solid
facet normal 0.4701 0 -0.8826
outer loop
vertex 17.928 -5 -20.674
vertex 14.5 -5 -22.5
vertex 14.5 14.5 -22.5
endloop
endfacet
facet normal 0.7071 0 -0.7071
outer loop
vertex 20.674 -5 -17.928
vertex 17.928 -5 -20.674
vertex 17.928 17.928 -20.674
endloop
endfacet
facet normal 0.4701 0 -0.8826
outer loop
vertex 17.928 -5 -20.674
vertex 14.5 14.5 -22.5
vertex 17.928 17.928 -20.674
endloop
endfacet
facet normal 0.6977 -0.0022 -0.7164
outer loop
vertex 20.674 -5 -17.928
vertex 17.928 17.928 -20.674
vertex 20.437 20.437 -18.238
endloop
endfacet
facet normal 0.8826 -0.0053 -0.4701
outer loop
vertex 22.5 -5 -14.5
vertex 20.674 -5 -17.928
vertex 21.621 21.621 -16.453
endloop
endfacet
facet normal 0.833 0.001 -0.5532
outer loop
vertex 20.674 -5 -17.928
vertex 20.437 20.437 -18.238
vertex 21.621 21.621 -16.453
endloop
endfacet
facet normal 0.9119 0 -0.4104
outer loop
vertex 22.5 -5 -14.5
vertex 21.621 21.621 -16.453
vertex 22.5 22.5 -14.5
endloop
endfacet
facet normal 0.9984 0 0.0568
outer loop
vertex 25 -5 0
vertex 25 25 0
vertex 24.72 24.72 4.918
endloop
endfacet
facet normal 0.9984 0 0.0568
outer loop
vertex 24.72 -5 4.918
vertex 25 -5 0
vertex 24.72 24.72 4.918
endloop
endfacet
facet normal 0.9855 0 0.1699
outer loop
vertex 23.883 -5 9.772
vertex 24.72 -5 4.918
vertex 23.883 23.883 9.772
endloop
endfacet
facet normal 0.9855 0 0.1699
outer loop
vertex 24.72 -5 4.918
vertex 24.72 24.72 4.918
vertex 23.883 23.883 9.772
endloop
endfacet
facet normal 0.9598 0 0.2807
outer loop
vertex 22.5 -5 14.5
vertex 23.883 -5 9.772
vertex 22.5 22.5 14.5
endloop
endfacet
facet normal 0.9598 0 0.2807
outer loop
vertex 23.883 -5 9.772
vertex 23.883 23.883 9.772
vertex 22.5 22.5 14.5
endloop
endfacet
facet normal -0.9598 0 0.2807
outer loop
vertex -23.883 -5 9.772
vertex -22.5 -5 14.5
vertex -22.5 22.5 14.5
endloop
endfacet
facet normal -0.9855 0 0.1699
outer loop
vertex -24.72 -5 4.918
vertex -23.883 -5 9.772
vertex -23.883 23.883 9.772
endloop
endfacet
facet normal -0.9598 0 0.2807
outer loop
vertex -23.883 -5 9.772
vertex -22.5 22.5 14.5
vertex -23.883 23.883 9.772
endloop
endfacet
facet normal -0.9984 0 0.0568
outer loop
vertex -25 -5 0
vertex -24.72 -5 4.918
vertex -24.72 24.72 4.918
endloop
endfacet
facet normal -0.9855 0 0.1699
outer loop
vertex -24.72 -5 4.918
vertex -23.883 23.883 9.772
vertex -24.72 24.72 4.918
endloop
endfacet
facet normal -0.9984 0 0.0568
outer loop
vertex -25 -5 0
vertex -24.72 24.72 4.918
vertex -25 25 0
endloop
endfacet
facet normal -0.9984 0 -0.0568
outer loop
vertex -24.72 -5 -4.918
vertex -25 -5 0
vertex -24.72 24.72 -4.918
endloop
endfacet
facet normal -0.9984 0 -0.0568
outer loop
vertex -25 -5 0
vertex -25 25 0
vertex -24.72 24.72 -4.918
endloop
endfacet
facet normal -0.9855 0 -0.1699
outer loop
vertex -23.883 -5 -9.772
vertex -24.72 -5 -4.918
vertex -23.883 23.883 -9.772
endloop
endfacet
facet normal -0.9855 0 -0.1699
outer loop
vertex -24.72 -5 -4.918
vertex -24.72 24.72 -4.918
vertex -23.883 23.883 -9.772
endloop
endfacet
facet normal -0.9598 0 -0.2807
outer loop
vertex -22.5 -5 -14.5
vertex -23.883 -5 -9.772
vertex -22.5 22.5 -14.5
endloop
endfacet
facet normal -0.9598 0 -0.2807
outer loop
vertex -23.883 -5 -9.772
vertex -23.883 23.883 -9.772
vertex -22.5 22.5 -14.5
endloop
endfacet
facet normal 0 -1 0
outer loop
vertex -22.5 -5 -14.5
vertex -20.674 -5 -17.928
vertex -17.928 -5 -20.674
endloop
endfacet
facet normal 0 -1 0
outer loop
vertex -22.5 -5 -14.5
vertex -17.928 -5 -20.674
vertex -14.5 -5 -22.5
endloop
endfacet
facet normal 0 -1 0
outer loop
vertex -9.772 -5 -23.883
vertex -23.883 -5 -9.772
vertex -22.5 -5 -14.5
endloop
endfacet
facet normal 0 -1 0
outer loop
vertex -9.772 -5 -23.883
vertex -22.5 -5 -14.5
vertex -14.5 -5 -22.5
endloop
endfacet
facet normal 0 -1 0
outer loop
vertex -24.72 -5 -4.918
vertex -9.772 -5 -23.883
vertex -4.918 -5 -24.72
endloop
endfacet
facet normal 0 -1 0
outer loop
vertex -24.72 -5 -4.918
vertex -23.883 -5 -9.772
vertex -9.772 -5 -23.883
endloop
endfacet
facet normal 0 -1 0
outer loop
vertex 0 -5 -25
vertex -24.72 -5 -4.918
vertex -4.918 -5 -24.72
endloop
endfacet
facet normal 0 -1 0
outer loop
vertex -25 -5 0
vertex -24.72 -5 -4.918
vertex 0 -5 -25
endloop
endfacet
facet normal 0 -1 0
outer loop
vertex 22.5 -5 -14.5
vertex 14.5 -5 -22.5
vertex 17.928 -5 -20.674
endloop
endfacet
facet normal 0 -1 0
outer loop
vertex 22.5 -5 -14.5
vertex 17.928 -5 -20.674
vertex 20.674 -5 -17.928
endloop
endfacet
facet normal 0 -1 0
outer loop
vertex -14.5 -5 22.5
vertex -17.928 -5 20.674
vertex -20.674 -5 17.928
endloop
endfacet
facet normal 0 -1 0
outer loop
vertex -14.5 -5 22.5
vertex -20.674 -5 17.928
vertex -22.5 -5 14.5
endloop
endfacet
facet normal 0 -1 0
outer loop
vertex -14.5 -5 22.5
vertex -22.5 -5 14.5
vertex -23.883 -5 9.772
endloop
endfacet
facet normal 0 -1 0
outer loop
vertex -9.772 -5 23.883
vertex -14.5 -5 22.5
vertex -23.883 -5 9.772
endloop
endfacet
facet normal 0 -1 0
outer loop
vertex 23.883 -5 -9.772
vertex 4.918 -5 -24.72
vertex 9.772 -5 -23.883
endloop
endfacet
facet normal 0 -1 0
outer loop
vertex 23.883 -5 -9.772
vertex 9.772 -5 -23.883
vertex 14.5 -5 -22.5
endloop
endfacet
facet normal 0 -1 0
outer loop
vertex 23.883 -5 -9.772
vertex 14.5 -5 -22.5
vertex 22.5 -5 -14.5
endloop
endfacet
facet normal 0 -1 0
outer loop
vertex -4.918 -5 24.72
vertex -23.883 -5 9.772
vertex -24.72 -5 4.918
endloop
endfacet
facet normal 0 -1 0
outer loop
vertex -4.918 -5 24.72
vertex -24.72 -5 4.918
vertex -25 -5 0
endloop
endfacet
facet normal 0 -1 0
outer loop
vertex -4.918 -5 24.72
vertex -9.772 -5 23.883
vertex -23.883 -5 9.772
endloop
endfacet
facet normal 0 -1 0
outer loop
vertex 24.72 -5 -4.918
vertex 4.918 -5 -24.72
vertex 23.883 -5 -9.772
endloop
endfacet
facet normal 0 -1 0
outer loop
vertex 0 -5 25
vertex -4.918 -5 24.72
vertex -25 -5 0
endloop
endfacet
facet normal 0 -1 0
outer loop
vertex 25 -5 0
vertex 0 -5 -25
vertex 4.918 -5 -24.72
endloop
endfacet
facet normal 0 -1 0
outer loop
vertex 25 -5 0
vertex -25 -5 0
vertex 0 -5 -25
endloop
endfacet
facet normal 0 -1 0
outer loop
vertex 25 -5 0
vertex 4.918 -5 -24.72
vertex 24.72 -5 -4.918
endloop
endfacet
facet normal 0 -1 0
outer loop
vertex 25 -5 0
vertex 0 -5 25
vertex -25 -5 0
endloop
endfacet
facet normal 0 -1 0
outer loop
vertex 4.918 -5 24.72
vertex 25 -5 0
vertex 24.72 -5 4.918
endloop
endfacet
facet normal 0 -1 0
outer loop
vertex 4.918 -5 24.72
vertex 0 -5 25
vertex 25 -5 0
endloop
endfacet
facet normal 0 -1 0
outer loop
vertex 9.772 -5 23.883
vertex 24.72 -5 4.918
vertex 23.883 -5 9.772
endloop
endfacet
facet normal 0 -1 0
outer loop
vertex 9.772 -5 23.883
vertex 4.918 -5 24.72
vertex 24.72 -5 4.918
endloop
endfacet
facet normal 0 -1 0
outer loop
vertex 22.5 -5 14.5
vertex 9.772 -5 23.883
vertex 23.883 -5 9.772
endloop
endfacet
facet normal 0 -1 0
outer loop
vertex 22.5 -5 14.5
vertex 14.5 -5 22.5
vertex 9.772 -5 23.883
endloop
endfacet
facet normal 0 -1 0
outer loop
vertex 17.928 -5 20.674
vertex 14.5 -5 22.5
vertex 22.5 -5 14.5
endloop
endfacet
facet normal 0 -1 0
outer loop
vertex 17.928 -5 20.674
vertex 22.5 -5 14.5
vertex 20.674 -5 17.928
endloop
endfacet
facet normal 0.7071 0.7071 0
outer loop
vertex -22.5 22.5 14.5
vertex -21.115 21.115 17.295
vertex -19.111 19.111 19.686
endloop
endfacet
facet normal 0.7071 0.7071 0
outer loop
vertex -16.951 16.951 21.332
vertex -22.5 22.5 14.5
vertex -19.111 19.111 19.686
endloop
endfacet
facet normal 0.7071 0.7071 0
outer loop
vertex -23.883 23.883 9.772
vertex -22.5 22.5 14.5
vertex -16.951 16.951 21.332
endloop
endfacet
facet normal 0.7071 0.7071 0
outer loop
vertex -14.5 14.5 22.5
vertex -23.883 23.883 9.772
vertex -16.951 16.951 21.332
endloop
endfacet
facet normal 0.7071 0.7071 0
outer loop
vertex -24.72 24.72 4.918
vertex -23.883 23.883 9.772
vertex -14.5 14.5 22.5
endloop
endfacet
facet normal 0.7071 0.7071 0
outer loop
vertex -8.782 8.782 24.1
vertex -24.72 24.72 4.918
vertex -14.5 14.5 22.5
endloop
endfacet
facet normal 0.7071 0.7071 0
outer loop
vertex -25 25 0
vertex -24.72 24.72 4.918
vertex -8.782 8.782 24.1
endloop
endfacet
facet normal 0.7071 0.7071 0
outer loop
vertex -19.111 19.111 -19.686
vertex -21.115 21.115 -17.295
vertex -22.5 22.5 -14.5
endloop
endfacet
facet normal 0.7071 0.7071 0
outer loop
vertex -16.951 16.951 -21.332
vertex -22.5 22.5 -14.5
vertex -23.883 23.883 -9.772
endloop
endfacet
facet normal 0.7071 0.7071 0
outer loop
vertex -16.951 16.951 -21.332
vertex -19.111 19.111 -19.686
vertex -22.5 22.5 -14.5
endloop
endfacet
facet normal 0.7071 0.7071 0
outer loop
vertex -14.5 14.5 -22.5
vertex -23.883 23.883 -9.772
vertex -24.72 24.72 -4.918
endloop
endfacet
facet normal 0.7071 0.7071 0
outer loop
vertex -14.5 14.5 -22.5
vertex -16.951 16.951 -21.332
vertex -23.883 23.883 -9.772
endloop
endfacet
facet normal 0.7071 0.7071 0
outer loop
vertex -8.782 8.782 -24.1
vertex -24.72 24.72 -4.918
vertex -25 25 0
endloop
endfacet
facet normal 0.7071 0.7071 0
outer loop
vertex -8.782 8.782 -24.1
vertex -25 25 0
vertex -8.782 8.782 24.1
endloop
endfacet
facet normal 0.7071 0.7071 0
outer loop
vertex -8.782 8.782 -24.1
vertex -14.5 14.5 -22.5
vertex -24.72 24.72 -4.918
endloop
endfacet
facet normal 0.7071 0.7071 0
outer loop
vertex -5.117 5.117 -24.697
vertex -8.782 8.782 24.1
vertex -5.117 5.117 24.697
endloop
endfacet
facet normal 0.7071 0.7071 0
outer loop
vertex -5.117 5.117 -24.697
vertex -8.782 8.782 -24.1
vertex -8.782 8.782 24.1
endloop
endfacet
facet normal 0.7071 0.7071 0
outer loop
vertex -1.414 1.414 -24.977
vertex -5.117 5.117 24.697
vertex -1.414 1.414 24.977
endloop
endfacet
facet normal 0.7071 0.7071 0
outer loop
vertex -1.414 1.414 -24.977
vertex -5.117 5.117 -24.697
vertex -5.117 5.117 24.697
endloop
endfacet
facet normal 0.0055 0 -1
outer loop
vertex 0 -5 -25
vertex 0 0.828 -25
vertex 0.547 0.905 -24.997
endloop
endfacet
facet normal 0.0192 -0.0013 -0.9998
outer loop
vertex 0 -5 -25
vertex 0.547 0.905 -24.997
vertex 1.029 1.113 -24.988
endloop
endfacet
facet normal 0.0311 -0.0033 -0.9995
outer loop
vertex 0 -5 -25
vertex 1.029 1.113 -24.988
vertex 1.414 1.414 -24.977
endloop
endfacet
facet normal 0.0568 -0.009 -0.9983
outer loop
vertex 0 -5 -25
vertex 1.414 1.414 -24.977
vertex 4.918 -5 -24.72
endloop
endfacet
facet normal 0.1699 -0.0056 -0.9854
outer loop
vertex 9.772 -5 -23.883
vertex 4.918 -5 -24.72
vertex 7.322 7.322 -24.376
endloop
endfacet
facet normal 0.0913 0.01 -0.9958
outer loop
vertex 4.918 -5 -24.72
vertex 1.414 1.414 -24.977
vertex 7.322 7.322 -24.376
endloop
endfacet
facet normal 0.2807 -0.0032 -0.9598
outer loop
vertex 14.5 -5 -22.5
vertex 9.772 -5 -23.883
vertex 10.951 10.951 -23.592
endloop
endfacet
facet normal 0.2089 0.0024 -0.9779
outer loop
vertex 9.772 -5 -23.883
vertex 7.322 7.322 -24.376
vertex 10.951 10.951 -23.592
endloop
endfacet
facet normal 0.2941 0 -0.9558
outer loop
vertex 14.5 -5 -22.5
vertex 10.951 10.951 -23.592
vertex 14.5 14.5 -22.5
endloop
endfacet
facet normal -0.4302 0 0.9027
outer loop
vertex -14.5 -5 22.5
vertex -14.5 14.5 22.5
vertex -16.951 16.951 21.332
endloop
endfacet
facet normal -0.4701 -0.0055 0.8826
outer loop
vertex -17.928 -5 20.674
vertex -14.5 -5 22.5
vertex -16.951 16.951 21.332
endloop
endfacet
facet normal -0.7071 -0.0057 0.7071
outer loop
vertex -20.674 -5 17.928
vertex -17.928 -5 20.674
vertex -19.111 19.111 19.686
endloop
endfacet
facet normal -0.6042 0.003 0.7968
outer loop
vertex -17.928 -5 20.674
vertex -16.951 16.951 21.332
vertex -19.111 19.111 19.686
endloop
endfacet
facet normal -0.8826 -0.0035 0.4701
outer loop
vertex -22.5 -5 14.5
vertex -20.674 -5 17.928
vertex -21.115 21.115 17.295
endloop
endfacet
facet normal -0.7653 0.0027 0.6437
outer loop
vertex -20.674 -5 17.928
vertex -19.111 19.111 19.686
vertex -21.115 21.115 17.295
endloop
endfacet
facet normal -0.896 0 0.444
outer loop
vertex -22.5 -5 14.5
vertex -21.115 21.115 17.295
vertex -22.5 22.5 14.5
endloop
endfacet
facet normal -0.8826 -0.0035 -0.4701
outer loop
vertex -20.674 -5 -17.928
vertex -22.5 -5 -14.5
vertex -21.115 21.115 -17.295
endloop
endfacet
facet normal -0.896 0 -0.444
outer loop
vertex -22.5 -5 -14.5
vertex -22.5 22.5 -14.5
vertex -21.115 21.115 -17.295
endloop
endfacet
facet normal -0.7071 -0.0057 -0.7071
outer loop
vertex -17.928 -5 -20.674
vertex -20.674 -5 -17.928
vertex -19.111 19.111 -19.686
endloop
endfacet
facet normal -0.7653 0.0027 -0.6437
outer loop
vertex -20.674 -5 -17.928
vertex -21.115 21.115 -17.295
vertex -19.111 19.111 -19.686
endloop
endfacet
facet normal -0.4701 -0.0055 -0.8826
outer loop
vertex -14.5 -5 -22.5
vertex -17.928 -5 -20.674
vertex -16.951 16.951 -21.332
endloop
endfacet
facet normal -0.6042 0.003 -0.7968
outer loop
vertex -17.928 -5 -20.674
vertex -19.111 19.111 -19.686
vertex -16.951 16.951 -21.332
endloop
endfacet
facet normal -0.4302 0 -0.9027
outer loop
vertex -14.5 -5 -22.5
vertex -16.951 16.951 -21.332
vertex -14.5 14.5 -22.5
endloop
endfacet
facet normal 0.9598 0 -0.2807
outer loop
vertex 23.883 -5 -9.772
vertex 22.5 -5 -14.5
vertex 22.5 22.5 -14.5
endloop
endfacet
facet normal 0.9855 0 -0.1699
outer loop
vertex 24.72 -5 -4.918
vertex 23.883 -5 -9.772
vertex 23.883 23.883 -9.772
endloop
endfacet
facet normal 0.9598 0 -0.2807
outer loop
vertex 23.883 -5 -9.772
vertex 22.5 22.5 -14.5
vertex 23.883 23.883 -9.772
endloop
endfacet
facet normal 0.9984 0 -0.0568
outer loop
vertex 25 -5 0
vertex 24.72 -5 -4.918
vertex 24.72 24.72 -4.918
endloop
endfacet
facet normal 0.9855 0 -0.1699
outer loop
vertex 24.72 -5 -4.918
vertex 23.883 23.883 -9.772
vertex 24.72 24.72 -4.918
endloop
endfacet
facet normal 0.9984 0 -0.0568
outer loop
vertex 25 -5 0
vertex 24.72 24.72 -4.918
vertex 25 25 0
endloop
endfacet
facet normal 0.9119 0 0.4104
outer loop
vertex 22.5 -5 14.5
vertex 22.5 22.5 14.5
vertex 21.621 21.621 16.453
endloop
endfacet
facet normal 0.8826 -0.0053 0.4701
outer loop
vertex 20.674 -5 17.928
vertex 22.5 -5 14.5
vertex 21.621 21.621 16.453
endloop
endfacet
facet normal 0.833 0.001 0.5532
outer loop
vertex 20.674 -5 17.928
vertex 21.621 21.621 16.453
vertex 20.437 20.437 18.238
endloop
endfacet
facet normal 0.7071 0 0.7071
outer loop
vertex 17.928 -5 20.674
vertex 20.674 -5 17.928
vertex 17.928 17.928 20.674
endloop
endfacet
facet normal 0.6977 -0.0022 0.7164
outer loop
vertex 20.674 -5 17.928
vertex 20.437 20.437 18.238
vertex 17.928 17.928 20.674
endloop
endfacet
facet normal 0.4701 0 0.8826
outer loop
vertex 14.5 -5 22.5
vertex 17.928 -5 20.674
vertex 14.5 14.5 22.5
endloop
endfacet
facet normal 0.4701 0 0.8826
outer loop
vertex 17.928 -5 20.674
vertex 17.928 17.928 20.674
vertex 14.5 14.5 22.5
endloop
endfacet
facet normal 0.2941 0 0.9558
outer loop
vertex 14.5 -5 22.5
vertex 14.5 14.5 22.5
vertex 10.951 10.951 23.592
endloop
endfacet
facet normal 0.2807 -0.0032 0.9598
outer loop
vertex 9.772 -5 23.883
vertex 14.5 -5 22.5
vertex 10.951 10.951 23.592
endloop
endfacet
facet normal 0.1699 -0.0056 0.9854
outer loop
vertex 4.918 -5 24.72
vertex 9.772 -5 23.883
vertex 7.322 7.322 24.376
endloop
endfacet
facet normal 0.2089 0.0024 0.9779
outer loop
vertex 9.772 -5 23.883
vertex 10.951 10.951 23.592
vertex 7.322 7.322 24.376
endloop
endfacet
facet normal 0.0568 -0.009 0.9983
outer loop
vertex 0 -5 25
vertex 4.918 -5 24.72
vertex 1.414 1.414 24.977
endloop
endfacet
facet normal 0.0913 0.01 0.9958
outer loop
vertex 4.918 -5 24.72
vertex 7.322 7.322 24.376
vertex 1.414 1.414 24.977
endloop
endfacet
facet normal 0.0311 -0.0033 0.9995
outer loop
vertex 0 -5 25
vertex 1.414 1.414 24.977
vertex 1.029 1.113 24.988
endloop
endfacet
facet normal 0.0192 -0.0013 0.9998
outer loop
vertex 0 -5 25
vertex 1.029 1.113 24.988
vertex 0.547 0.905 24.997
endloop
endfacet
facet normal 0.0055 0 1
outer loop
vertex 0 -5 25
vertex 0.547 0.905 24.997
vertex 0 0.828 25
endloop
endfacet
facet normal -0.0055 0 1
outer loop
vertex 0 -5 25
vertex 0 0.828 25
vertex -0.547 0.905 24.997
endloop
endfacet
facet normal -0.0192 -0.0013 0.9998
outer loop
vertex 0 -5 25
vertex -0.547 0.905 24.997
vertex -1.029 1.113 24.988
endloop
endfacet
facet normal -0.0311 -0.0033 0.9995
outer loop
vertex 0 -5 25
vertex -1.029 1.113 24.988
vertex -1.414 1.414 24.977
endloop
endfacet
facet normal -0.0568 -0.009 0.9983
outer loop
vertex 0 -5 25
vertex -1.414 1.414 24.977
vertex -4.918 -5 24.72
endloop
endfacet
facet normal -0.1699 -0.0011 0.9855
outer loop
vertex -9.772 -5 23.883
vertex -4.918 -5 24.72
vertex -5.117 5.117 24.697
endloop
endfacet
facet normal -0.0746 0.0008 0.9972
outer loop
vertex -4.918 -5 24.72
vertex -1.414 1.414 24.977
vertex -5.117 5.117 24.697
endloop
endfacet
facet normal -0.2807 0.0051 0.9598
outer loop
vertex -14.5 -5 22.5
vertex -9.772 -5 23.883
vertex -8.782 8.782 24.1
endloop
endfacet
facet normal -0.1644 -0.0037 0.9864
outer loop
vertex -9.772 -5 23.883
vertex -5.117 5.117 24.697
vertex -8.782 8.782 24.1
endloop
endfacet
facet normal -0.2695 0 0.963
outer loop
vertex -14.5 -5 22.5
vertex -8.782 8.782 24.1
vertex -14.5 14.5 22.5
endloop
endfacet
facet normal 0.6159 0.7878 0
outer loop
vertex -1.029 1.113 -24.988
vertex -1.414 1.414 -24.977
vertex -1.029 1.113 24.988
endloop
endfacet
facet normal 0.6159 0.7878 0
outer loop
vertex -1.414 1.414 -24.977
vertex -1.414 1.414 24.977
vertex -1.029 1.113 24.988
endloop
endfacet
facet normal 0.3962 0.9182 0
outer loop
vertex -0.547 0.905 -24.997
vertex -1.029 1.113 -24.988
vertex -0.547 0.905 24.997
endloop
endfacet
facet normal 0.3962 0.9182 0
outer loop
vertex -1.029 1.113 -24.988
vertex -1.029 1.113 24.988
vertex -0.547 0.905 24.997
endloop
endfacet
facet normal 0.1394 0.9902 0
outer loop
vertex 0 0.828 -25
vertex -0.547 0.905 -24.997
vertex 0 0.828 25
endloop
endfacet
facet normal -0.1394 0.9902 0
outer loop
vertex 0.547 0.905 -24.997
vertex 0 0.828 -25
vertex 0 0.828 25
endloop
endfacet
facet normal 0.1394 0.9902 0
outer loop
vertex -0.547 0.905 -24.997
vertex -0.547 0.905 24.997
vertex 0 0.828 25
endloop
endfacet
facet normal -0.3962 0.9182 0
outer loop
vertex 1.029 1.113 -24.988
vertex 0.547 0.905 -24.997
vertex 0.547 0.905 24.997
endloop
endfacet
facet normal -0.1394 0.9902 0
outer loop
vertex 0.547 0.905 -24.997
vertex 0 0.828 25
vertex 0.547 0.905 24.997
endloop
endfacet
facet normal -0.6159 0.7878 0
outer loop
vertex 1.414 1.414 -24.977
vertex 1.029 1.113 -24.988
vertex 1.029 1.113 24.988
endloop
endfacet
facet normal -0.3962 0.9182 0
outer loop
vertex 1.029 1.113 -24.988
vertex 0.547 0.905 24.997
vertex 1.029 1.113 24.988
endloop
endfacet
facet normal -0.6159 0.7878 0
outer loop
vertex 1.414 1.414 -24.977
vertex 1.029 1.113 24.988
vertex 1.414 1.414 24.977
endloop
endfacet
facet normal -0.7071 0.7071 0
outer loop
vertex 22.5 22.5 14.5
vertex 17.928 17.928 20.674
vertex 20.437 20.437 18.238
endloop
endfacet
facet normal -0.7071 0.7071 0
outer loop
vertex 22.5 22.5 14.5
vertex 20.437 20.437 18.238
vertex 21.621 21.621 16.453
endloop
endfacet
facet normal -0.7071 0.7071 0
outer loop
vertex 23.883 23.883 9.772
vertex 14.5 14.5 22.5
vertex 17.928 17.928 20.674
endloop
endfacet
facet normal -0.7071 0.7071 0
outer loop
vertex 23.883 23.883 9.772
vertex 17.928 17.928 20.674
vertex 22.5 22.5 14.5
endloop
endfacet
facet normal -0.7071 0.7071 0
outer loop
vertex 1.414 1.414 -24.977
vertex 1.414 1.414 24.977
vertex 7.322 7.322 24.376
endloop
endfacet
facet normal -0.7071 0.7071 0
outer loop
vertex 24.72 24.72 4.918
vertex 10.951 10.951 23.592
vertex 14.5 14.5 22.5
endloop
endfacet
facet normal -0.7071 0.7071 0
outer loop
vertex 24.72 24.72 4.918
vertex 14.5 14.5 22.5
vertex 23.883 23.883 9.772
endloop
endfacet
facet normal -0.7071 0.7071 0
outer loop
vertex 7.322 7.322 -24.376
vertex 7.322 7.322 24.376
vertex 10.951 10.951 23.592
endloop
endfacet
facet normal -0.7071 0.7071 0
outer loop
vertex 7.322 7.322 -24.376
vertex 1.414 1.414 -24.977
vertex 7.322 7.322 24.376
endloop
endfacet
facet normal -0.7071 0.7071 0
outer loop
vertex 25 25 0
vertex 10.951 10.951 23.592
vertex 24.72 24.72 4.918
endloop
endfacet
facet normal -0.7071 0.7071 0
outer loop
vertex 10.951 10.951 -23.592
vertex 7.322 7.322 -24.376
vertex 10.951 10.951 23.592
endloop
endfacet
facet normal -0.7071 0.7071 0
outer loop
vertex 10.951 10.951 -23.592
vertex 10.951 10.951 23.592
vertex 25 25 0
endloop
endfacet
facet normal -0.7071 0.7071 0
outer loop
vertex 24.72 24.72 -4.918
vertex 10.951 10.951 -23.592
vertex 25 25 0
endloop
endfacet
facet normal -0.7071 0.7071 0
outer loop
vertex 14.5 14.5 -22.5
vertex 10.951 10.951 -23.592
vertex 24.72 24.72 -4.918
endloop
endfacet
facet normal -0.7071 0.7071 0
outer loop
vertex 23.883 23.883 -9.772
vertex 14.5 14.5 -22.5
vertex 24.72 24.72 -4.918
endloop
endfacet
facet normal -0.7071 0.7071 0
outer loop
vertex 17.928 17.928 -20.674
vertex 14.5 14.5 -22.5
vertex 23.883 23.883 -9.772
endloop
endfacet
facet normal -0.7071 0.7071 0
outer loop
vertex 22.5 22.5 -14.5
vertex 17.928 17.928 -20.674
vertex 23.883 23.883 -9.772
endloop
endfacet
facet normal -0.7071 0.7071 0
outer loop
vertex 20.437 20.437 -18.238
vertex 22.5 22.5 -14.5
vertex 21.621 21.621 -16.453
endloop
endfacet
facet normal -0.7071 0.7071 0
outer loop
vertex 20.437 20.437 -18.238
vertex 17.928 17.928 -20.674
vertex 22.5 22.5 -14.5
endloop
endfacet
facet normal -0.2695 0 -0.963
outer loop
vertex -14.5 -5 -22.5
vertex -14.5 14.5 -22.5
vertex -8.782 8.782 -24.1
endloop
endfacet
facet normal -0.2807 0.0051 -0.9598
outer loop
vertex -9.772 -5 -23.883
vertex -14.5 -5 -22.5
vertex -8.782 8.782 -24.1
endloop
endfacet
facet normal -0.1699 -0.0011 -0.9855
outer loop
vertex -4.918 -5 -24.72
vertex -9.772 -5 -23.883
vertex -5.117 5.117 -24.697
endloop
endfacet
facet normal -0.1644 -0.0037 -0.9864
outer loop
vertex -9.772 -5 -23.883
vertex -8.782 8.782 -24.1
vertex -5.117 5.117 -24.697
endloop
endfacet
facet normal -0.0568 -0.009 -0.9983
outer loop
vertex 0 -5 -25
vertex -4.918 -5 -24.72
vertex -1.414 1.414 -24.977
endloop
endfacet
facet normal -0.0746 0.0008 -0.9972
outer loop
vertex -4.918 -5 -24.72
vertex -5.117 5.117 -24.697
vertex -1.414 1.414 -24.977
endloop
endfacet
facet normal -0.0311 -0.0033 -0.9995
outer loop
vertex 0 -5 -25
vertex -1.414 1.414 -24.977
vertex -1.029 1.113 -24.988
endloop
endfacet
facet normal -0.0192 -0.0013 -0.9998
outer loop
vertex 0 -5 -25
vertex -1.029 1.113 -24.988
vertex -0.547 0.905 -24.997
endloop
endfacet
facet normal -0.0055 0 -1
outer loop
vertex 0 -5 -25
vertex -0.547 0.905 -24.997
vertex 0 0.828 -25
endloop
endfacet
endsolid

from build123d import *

# Parameters (mm, degrees)
F1_DEPTH      = 50
F1_DEPTH_BACK = 5
F3_DEPTH      = 25.001
F3_DEPTH_BACK = 25.001
F4_R          = 2


with BuildPart() as f1:
    # F0 (on Front) → F1 (new body, two sides)
    with BuildSketch(Plane.XZ) as f1_sk:
        with BuildLine():
            ThreePointArc((14.5, 22.5), (7.3569694848, 24.3704230117), (0, 25))
            ThreePointArc((0, 25), (-7.3569694848, 24.3704230117), (-14.5, 22.5))
            ThreePointArc((-14.5, 22.5), (-19.4027296199, 19.4027296199), (-22.5, 14.5))
            ThreePointArc((-22.5, 14.5), (-24.3704230117, 7.3569694848), (-25, 0))
            ThreePointArc((-25, 0), (-24.3704230117, -7.3569694848), (-22.5, -14.5))
            ThreePointArc((-22.5, -14.5), (-19.4027296199, -19.4027296199), (-14.5, -22.5))
            ThreePointArc((-14.5, -22.5), (-7.3569694848, -24.3704230117), (0, -25))
            ThreePointArc((0, -25), (7.3569694848, -24.3704230117), (14.5, -22.5))
            ThreePointArc((14.5, -22.5), (19.4027296199, -19.4027296199), (22.5, -14.5))
            ThreePointArc((22.5, -14.5), (24.3704230117, -7.3569694848), (25, 0))
            ThreePointArc((25, 0), (24.3704230117, 7.3569694848), (22.5, 14.5))
            ThreePointArc((22.5, 14.5), (19.4027296199, 19.4027296199), (14.5, 22.5))
        make_face()
    extrude(amount=-F1_DEPTH)
    extrude(f1_sk.sketch, amount=F1_DEPTH_BACK)

    # F2 (on Top) → F3 (cut, two sides)
    with BuildSketch(Plane.XY) as f3_sk:
        Polygon((-25, 25), (0, 0), (25, 25), (25, 50), (0, 50), (-25, 50), align=None)
    extrude(amount=-F3_DEPTH, mode=Mode.SUBTRACT)
    extrude(f3_sk.sketch, amount=F3_DEPTH_BACK, mode=Mode.SUBTRACT)

    # F4
    f4_edges = [f1.edges().sort_by_distance(p)[0] for p in [
        (0, 0, 0),
    ]]
    fillet(f4_edges, radius=F4_R)


solid = f1.part
